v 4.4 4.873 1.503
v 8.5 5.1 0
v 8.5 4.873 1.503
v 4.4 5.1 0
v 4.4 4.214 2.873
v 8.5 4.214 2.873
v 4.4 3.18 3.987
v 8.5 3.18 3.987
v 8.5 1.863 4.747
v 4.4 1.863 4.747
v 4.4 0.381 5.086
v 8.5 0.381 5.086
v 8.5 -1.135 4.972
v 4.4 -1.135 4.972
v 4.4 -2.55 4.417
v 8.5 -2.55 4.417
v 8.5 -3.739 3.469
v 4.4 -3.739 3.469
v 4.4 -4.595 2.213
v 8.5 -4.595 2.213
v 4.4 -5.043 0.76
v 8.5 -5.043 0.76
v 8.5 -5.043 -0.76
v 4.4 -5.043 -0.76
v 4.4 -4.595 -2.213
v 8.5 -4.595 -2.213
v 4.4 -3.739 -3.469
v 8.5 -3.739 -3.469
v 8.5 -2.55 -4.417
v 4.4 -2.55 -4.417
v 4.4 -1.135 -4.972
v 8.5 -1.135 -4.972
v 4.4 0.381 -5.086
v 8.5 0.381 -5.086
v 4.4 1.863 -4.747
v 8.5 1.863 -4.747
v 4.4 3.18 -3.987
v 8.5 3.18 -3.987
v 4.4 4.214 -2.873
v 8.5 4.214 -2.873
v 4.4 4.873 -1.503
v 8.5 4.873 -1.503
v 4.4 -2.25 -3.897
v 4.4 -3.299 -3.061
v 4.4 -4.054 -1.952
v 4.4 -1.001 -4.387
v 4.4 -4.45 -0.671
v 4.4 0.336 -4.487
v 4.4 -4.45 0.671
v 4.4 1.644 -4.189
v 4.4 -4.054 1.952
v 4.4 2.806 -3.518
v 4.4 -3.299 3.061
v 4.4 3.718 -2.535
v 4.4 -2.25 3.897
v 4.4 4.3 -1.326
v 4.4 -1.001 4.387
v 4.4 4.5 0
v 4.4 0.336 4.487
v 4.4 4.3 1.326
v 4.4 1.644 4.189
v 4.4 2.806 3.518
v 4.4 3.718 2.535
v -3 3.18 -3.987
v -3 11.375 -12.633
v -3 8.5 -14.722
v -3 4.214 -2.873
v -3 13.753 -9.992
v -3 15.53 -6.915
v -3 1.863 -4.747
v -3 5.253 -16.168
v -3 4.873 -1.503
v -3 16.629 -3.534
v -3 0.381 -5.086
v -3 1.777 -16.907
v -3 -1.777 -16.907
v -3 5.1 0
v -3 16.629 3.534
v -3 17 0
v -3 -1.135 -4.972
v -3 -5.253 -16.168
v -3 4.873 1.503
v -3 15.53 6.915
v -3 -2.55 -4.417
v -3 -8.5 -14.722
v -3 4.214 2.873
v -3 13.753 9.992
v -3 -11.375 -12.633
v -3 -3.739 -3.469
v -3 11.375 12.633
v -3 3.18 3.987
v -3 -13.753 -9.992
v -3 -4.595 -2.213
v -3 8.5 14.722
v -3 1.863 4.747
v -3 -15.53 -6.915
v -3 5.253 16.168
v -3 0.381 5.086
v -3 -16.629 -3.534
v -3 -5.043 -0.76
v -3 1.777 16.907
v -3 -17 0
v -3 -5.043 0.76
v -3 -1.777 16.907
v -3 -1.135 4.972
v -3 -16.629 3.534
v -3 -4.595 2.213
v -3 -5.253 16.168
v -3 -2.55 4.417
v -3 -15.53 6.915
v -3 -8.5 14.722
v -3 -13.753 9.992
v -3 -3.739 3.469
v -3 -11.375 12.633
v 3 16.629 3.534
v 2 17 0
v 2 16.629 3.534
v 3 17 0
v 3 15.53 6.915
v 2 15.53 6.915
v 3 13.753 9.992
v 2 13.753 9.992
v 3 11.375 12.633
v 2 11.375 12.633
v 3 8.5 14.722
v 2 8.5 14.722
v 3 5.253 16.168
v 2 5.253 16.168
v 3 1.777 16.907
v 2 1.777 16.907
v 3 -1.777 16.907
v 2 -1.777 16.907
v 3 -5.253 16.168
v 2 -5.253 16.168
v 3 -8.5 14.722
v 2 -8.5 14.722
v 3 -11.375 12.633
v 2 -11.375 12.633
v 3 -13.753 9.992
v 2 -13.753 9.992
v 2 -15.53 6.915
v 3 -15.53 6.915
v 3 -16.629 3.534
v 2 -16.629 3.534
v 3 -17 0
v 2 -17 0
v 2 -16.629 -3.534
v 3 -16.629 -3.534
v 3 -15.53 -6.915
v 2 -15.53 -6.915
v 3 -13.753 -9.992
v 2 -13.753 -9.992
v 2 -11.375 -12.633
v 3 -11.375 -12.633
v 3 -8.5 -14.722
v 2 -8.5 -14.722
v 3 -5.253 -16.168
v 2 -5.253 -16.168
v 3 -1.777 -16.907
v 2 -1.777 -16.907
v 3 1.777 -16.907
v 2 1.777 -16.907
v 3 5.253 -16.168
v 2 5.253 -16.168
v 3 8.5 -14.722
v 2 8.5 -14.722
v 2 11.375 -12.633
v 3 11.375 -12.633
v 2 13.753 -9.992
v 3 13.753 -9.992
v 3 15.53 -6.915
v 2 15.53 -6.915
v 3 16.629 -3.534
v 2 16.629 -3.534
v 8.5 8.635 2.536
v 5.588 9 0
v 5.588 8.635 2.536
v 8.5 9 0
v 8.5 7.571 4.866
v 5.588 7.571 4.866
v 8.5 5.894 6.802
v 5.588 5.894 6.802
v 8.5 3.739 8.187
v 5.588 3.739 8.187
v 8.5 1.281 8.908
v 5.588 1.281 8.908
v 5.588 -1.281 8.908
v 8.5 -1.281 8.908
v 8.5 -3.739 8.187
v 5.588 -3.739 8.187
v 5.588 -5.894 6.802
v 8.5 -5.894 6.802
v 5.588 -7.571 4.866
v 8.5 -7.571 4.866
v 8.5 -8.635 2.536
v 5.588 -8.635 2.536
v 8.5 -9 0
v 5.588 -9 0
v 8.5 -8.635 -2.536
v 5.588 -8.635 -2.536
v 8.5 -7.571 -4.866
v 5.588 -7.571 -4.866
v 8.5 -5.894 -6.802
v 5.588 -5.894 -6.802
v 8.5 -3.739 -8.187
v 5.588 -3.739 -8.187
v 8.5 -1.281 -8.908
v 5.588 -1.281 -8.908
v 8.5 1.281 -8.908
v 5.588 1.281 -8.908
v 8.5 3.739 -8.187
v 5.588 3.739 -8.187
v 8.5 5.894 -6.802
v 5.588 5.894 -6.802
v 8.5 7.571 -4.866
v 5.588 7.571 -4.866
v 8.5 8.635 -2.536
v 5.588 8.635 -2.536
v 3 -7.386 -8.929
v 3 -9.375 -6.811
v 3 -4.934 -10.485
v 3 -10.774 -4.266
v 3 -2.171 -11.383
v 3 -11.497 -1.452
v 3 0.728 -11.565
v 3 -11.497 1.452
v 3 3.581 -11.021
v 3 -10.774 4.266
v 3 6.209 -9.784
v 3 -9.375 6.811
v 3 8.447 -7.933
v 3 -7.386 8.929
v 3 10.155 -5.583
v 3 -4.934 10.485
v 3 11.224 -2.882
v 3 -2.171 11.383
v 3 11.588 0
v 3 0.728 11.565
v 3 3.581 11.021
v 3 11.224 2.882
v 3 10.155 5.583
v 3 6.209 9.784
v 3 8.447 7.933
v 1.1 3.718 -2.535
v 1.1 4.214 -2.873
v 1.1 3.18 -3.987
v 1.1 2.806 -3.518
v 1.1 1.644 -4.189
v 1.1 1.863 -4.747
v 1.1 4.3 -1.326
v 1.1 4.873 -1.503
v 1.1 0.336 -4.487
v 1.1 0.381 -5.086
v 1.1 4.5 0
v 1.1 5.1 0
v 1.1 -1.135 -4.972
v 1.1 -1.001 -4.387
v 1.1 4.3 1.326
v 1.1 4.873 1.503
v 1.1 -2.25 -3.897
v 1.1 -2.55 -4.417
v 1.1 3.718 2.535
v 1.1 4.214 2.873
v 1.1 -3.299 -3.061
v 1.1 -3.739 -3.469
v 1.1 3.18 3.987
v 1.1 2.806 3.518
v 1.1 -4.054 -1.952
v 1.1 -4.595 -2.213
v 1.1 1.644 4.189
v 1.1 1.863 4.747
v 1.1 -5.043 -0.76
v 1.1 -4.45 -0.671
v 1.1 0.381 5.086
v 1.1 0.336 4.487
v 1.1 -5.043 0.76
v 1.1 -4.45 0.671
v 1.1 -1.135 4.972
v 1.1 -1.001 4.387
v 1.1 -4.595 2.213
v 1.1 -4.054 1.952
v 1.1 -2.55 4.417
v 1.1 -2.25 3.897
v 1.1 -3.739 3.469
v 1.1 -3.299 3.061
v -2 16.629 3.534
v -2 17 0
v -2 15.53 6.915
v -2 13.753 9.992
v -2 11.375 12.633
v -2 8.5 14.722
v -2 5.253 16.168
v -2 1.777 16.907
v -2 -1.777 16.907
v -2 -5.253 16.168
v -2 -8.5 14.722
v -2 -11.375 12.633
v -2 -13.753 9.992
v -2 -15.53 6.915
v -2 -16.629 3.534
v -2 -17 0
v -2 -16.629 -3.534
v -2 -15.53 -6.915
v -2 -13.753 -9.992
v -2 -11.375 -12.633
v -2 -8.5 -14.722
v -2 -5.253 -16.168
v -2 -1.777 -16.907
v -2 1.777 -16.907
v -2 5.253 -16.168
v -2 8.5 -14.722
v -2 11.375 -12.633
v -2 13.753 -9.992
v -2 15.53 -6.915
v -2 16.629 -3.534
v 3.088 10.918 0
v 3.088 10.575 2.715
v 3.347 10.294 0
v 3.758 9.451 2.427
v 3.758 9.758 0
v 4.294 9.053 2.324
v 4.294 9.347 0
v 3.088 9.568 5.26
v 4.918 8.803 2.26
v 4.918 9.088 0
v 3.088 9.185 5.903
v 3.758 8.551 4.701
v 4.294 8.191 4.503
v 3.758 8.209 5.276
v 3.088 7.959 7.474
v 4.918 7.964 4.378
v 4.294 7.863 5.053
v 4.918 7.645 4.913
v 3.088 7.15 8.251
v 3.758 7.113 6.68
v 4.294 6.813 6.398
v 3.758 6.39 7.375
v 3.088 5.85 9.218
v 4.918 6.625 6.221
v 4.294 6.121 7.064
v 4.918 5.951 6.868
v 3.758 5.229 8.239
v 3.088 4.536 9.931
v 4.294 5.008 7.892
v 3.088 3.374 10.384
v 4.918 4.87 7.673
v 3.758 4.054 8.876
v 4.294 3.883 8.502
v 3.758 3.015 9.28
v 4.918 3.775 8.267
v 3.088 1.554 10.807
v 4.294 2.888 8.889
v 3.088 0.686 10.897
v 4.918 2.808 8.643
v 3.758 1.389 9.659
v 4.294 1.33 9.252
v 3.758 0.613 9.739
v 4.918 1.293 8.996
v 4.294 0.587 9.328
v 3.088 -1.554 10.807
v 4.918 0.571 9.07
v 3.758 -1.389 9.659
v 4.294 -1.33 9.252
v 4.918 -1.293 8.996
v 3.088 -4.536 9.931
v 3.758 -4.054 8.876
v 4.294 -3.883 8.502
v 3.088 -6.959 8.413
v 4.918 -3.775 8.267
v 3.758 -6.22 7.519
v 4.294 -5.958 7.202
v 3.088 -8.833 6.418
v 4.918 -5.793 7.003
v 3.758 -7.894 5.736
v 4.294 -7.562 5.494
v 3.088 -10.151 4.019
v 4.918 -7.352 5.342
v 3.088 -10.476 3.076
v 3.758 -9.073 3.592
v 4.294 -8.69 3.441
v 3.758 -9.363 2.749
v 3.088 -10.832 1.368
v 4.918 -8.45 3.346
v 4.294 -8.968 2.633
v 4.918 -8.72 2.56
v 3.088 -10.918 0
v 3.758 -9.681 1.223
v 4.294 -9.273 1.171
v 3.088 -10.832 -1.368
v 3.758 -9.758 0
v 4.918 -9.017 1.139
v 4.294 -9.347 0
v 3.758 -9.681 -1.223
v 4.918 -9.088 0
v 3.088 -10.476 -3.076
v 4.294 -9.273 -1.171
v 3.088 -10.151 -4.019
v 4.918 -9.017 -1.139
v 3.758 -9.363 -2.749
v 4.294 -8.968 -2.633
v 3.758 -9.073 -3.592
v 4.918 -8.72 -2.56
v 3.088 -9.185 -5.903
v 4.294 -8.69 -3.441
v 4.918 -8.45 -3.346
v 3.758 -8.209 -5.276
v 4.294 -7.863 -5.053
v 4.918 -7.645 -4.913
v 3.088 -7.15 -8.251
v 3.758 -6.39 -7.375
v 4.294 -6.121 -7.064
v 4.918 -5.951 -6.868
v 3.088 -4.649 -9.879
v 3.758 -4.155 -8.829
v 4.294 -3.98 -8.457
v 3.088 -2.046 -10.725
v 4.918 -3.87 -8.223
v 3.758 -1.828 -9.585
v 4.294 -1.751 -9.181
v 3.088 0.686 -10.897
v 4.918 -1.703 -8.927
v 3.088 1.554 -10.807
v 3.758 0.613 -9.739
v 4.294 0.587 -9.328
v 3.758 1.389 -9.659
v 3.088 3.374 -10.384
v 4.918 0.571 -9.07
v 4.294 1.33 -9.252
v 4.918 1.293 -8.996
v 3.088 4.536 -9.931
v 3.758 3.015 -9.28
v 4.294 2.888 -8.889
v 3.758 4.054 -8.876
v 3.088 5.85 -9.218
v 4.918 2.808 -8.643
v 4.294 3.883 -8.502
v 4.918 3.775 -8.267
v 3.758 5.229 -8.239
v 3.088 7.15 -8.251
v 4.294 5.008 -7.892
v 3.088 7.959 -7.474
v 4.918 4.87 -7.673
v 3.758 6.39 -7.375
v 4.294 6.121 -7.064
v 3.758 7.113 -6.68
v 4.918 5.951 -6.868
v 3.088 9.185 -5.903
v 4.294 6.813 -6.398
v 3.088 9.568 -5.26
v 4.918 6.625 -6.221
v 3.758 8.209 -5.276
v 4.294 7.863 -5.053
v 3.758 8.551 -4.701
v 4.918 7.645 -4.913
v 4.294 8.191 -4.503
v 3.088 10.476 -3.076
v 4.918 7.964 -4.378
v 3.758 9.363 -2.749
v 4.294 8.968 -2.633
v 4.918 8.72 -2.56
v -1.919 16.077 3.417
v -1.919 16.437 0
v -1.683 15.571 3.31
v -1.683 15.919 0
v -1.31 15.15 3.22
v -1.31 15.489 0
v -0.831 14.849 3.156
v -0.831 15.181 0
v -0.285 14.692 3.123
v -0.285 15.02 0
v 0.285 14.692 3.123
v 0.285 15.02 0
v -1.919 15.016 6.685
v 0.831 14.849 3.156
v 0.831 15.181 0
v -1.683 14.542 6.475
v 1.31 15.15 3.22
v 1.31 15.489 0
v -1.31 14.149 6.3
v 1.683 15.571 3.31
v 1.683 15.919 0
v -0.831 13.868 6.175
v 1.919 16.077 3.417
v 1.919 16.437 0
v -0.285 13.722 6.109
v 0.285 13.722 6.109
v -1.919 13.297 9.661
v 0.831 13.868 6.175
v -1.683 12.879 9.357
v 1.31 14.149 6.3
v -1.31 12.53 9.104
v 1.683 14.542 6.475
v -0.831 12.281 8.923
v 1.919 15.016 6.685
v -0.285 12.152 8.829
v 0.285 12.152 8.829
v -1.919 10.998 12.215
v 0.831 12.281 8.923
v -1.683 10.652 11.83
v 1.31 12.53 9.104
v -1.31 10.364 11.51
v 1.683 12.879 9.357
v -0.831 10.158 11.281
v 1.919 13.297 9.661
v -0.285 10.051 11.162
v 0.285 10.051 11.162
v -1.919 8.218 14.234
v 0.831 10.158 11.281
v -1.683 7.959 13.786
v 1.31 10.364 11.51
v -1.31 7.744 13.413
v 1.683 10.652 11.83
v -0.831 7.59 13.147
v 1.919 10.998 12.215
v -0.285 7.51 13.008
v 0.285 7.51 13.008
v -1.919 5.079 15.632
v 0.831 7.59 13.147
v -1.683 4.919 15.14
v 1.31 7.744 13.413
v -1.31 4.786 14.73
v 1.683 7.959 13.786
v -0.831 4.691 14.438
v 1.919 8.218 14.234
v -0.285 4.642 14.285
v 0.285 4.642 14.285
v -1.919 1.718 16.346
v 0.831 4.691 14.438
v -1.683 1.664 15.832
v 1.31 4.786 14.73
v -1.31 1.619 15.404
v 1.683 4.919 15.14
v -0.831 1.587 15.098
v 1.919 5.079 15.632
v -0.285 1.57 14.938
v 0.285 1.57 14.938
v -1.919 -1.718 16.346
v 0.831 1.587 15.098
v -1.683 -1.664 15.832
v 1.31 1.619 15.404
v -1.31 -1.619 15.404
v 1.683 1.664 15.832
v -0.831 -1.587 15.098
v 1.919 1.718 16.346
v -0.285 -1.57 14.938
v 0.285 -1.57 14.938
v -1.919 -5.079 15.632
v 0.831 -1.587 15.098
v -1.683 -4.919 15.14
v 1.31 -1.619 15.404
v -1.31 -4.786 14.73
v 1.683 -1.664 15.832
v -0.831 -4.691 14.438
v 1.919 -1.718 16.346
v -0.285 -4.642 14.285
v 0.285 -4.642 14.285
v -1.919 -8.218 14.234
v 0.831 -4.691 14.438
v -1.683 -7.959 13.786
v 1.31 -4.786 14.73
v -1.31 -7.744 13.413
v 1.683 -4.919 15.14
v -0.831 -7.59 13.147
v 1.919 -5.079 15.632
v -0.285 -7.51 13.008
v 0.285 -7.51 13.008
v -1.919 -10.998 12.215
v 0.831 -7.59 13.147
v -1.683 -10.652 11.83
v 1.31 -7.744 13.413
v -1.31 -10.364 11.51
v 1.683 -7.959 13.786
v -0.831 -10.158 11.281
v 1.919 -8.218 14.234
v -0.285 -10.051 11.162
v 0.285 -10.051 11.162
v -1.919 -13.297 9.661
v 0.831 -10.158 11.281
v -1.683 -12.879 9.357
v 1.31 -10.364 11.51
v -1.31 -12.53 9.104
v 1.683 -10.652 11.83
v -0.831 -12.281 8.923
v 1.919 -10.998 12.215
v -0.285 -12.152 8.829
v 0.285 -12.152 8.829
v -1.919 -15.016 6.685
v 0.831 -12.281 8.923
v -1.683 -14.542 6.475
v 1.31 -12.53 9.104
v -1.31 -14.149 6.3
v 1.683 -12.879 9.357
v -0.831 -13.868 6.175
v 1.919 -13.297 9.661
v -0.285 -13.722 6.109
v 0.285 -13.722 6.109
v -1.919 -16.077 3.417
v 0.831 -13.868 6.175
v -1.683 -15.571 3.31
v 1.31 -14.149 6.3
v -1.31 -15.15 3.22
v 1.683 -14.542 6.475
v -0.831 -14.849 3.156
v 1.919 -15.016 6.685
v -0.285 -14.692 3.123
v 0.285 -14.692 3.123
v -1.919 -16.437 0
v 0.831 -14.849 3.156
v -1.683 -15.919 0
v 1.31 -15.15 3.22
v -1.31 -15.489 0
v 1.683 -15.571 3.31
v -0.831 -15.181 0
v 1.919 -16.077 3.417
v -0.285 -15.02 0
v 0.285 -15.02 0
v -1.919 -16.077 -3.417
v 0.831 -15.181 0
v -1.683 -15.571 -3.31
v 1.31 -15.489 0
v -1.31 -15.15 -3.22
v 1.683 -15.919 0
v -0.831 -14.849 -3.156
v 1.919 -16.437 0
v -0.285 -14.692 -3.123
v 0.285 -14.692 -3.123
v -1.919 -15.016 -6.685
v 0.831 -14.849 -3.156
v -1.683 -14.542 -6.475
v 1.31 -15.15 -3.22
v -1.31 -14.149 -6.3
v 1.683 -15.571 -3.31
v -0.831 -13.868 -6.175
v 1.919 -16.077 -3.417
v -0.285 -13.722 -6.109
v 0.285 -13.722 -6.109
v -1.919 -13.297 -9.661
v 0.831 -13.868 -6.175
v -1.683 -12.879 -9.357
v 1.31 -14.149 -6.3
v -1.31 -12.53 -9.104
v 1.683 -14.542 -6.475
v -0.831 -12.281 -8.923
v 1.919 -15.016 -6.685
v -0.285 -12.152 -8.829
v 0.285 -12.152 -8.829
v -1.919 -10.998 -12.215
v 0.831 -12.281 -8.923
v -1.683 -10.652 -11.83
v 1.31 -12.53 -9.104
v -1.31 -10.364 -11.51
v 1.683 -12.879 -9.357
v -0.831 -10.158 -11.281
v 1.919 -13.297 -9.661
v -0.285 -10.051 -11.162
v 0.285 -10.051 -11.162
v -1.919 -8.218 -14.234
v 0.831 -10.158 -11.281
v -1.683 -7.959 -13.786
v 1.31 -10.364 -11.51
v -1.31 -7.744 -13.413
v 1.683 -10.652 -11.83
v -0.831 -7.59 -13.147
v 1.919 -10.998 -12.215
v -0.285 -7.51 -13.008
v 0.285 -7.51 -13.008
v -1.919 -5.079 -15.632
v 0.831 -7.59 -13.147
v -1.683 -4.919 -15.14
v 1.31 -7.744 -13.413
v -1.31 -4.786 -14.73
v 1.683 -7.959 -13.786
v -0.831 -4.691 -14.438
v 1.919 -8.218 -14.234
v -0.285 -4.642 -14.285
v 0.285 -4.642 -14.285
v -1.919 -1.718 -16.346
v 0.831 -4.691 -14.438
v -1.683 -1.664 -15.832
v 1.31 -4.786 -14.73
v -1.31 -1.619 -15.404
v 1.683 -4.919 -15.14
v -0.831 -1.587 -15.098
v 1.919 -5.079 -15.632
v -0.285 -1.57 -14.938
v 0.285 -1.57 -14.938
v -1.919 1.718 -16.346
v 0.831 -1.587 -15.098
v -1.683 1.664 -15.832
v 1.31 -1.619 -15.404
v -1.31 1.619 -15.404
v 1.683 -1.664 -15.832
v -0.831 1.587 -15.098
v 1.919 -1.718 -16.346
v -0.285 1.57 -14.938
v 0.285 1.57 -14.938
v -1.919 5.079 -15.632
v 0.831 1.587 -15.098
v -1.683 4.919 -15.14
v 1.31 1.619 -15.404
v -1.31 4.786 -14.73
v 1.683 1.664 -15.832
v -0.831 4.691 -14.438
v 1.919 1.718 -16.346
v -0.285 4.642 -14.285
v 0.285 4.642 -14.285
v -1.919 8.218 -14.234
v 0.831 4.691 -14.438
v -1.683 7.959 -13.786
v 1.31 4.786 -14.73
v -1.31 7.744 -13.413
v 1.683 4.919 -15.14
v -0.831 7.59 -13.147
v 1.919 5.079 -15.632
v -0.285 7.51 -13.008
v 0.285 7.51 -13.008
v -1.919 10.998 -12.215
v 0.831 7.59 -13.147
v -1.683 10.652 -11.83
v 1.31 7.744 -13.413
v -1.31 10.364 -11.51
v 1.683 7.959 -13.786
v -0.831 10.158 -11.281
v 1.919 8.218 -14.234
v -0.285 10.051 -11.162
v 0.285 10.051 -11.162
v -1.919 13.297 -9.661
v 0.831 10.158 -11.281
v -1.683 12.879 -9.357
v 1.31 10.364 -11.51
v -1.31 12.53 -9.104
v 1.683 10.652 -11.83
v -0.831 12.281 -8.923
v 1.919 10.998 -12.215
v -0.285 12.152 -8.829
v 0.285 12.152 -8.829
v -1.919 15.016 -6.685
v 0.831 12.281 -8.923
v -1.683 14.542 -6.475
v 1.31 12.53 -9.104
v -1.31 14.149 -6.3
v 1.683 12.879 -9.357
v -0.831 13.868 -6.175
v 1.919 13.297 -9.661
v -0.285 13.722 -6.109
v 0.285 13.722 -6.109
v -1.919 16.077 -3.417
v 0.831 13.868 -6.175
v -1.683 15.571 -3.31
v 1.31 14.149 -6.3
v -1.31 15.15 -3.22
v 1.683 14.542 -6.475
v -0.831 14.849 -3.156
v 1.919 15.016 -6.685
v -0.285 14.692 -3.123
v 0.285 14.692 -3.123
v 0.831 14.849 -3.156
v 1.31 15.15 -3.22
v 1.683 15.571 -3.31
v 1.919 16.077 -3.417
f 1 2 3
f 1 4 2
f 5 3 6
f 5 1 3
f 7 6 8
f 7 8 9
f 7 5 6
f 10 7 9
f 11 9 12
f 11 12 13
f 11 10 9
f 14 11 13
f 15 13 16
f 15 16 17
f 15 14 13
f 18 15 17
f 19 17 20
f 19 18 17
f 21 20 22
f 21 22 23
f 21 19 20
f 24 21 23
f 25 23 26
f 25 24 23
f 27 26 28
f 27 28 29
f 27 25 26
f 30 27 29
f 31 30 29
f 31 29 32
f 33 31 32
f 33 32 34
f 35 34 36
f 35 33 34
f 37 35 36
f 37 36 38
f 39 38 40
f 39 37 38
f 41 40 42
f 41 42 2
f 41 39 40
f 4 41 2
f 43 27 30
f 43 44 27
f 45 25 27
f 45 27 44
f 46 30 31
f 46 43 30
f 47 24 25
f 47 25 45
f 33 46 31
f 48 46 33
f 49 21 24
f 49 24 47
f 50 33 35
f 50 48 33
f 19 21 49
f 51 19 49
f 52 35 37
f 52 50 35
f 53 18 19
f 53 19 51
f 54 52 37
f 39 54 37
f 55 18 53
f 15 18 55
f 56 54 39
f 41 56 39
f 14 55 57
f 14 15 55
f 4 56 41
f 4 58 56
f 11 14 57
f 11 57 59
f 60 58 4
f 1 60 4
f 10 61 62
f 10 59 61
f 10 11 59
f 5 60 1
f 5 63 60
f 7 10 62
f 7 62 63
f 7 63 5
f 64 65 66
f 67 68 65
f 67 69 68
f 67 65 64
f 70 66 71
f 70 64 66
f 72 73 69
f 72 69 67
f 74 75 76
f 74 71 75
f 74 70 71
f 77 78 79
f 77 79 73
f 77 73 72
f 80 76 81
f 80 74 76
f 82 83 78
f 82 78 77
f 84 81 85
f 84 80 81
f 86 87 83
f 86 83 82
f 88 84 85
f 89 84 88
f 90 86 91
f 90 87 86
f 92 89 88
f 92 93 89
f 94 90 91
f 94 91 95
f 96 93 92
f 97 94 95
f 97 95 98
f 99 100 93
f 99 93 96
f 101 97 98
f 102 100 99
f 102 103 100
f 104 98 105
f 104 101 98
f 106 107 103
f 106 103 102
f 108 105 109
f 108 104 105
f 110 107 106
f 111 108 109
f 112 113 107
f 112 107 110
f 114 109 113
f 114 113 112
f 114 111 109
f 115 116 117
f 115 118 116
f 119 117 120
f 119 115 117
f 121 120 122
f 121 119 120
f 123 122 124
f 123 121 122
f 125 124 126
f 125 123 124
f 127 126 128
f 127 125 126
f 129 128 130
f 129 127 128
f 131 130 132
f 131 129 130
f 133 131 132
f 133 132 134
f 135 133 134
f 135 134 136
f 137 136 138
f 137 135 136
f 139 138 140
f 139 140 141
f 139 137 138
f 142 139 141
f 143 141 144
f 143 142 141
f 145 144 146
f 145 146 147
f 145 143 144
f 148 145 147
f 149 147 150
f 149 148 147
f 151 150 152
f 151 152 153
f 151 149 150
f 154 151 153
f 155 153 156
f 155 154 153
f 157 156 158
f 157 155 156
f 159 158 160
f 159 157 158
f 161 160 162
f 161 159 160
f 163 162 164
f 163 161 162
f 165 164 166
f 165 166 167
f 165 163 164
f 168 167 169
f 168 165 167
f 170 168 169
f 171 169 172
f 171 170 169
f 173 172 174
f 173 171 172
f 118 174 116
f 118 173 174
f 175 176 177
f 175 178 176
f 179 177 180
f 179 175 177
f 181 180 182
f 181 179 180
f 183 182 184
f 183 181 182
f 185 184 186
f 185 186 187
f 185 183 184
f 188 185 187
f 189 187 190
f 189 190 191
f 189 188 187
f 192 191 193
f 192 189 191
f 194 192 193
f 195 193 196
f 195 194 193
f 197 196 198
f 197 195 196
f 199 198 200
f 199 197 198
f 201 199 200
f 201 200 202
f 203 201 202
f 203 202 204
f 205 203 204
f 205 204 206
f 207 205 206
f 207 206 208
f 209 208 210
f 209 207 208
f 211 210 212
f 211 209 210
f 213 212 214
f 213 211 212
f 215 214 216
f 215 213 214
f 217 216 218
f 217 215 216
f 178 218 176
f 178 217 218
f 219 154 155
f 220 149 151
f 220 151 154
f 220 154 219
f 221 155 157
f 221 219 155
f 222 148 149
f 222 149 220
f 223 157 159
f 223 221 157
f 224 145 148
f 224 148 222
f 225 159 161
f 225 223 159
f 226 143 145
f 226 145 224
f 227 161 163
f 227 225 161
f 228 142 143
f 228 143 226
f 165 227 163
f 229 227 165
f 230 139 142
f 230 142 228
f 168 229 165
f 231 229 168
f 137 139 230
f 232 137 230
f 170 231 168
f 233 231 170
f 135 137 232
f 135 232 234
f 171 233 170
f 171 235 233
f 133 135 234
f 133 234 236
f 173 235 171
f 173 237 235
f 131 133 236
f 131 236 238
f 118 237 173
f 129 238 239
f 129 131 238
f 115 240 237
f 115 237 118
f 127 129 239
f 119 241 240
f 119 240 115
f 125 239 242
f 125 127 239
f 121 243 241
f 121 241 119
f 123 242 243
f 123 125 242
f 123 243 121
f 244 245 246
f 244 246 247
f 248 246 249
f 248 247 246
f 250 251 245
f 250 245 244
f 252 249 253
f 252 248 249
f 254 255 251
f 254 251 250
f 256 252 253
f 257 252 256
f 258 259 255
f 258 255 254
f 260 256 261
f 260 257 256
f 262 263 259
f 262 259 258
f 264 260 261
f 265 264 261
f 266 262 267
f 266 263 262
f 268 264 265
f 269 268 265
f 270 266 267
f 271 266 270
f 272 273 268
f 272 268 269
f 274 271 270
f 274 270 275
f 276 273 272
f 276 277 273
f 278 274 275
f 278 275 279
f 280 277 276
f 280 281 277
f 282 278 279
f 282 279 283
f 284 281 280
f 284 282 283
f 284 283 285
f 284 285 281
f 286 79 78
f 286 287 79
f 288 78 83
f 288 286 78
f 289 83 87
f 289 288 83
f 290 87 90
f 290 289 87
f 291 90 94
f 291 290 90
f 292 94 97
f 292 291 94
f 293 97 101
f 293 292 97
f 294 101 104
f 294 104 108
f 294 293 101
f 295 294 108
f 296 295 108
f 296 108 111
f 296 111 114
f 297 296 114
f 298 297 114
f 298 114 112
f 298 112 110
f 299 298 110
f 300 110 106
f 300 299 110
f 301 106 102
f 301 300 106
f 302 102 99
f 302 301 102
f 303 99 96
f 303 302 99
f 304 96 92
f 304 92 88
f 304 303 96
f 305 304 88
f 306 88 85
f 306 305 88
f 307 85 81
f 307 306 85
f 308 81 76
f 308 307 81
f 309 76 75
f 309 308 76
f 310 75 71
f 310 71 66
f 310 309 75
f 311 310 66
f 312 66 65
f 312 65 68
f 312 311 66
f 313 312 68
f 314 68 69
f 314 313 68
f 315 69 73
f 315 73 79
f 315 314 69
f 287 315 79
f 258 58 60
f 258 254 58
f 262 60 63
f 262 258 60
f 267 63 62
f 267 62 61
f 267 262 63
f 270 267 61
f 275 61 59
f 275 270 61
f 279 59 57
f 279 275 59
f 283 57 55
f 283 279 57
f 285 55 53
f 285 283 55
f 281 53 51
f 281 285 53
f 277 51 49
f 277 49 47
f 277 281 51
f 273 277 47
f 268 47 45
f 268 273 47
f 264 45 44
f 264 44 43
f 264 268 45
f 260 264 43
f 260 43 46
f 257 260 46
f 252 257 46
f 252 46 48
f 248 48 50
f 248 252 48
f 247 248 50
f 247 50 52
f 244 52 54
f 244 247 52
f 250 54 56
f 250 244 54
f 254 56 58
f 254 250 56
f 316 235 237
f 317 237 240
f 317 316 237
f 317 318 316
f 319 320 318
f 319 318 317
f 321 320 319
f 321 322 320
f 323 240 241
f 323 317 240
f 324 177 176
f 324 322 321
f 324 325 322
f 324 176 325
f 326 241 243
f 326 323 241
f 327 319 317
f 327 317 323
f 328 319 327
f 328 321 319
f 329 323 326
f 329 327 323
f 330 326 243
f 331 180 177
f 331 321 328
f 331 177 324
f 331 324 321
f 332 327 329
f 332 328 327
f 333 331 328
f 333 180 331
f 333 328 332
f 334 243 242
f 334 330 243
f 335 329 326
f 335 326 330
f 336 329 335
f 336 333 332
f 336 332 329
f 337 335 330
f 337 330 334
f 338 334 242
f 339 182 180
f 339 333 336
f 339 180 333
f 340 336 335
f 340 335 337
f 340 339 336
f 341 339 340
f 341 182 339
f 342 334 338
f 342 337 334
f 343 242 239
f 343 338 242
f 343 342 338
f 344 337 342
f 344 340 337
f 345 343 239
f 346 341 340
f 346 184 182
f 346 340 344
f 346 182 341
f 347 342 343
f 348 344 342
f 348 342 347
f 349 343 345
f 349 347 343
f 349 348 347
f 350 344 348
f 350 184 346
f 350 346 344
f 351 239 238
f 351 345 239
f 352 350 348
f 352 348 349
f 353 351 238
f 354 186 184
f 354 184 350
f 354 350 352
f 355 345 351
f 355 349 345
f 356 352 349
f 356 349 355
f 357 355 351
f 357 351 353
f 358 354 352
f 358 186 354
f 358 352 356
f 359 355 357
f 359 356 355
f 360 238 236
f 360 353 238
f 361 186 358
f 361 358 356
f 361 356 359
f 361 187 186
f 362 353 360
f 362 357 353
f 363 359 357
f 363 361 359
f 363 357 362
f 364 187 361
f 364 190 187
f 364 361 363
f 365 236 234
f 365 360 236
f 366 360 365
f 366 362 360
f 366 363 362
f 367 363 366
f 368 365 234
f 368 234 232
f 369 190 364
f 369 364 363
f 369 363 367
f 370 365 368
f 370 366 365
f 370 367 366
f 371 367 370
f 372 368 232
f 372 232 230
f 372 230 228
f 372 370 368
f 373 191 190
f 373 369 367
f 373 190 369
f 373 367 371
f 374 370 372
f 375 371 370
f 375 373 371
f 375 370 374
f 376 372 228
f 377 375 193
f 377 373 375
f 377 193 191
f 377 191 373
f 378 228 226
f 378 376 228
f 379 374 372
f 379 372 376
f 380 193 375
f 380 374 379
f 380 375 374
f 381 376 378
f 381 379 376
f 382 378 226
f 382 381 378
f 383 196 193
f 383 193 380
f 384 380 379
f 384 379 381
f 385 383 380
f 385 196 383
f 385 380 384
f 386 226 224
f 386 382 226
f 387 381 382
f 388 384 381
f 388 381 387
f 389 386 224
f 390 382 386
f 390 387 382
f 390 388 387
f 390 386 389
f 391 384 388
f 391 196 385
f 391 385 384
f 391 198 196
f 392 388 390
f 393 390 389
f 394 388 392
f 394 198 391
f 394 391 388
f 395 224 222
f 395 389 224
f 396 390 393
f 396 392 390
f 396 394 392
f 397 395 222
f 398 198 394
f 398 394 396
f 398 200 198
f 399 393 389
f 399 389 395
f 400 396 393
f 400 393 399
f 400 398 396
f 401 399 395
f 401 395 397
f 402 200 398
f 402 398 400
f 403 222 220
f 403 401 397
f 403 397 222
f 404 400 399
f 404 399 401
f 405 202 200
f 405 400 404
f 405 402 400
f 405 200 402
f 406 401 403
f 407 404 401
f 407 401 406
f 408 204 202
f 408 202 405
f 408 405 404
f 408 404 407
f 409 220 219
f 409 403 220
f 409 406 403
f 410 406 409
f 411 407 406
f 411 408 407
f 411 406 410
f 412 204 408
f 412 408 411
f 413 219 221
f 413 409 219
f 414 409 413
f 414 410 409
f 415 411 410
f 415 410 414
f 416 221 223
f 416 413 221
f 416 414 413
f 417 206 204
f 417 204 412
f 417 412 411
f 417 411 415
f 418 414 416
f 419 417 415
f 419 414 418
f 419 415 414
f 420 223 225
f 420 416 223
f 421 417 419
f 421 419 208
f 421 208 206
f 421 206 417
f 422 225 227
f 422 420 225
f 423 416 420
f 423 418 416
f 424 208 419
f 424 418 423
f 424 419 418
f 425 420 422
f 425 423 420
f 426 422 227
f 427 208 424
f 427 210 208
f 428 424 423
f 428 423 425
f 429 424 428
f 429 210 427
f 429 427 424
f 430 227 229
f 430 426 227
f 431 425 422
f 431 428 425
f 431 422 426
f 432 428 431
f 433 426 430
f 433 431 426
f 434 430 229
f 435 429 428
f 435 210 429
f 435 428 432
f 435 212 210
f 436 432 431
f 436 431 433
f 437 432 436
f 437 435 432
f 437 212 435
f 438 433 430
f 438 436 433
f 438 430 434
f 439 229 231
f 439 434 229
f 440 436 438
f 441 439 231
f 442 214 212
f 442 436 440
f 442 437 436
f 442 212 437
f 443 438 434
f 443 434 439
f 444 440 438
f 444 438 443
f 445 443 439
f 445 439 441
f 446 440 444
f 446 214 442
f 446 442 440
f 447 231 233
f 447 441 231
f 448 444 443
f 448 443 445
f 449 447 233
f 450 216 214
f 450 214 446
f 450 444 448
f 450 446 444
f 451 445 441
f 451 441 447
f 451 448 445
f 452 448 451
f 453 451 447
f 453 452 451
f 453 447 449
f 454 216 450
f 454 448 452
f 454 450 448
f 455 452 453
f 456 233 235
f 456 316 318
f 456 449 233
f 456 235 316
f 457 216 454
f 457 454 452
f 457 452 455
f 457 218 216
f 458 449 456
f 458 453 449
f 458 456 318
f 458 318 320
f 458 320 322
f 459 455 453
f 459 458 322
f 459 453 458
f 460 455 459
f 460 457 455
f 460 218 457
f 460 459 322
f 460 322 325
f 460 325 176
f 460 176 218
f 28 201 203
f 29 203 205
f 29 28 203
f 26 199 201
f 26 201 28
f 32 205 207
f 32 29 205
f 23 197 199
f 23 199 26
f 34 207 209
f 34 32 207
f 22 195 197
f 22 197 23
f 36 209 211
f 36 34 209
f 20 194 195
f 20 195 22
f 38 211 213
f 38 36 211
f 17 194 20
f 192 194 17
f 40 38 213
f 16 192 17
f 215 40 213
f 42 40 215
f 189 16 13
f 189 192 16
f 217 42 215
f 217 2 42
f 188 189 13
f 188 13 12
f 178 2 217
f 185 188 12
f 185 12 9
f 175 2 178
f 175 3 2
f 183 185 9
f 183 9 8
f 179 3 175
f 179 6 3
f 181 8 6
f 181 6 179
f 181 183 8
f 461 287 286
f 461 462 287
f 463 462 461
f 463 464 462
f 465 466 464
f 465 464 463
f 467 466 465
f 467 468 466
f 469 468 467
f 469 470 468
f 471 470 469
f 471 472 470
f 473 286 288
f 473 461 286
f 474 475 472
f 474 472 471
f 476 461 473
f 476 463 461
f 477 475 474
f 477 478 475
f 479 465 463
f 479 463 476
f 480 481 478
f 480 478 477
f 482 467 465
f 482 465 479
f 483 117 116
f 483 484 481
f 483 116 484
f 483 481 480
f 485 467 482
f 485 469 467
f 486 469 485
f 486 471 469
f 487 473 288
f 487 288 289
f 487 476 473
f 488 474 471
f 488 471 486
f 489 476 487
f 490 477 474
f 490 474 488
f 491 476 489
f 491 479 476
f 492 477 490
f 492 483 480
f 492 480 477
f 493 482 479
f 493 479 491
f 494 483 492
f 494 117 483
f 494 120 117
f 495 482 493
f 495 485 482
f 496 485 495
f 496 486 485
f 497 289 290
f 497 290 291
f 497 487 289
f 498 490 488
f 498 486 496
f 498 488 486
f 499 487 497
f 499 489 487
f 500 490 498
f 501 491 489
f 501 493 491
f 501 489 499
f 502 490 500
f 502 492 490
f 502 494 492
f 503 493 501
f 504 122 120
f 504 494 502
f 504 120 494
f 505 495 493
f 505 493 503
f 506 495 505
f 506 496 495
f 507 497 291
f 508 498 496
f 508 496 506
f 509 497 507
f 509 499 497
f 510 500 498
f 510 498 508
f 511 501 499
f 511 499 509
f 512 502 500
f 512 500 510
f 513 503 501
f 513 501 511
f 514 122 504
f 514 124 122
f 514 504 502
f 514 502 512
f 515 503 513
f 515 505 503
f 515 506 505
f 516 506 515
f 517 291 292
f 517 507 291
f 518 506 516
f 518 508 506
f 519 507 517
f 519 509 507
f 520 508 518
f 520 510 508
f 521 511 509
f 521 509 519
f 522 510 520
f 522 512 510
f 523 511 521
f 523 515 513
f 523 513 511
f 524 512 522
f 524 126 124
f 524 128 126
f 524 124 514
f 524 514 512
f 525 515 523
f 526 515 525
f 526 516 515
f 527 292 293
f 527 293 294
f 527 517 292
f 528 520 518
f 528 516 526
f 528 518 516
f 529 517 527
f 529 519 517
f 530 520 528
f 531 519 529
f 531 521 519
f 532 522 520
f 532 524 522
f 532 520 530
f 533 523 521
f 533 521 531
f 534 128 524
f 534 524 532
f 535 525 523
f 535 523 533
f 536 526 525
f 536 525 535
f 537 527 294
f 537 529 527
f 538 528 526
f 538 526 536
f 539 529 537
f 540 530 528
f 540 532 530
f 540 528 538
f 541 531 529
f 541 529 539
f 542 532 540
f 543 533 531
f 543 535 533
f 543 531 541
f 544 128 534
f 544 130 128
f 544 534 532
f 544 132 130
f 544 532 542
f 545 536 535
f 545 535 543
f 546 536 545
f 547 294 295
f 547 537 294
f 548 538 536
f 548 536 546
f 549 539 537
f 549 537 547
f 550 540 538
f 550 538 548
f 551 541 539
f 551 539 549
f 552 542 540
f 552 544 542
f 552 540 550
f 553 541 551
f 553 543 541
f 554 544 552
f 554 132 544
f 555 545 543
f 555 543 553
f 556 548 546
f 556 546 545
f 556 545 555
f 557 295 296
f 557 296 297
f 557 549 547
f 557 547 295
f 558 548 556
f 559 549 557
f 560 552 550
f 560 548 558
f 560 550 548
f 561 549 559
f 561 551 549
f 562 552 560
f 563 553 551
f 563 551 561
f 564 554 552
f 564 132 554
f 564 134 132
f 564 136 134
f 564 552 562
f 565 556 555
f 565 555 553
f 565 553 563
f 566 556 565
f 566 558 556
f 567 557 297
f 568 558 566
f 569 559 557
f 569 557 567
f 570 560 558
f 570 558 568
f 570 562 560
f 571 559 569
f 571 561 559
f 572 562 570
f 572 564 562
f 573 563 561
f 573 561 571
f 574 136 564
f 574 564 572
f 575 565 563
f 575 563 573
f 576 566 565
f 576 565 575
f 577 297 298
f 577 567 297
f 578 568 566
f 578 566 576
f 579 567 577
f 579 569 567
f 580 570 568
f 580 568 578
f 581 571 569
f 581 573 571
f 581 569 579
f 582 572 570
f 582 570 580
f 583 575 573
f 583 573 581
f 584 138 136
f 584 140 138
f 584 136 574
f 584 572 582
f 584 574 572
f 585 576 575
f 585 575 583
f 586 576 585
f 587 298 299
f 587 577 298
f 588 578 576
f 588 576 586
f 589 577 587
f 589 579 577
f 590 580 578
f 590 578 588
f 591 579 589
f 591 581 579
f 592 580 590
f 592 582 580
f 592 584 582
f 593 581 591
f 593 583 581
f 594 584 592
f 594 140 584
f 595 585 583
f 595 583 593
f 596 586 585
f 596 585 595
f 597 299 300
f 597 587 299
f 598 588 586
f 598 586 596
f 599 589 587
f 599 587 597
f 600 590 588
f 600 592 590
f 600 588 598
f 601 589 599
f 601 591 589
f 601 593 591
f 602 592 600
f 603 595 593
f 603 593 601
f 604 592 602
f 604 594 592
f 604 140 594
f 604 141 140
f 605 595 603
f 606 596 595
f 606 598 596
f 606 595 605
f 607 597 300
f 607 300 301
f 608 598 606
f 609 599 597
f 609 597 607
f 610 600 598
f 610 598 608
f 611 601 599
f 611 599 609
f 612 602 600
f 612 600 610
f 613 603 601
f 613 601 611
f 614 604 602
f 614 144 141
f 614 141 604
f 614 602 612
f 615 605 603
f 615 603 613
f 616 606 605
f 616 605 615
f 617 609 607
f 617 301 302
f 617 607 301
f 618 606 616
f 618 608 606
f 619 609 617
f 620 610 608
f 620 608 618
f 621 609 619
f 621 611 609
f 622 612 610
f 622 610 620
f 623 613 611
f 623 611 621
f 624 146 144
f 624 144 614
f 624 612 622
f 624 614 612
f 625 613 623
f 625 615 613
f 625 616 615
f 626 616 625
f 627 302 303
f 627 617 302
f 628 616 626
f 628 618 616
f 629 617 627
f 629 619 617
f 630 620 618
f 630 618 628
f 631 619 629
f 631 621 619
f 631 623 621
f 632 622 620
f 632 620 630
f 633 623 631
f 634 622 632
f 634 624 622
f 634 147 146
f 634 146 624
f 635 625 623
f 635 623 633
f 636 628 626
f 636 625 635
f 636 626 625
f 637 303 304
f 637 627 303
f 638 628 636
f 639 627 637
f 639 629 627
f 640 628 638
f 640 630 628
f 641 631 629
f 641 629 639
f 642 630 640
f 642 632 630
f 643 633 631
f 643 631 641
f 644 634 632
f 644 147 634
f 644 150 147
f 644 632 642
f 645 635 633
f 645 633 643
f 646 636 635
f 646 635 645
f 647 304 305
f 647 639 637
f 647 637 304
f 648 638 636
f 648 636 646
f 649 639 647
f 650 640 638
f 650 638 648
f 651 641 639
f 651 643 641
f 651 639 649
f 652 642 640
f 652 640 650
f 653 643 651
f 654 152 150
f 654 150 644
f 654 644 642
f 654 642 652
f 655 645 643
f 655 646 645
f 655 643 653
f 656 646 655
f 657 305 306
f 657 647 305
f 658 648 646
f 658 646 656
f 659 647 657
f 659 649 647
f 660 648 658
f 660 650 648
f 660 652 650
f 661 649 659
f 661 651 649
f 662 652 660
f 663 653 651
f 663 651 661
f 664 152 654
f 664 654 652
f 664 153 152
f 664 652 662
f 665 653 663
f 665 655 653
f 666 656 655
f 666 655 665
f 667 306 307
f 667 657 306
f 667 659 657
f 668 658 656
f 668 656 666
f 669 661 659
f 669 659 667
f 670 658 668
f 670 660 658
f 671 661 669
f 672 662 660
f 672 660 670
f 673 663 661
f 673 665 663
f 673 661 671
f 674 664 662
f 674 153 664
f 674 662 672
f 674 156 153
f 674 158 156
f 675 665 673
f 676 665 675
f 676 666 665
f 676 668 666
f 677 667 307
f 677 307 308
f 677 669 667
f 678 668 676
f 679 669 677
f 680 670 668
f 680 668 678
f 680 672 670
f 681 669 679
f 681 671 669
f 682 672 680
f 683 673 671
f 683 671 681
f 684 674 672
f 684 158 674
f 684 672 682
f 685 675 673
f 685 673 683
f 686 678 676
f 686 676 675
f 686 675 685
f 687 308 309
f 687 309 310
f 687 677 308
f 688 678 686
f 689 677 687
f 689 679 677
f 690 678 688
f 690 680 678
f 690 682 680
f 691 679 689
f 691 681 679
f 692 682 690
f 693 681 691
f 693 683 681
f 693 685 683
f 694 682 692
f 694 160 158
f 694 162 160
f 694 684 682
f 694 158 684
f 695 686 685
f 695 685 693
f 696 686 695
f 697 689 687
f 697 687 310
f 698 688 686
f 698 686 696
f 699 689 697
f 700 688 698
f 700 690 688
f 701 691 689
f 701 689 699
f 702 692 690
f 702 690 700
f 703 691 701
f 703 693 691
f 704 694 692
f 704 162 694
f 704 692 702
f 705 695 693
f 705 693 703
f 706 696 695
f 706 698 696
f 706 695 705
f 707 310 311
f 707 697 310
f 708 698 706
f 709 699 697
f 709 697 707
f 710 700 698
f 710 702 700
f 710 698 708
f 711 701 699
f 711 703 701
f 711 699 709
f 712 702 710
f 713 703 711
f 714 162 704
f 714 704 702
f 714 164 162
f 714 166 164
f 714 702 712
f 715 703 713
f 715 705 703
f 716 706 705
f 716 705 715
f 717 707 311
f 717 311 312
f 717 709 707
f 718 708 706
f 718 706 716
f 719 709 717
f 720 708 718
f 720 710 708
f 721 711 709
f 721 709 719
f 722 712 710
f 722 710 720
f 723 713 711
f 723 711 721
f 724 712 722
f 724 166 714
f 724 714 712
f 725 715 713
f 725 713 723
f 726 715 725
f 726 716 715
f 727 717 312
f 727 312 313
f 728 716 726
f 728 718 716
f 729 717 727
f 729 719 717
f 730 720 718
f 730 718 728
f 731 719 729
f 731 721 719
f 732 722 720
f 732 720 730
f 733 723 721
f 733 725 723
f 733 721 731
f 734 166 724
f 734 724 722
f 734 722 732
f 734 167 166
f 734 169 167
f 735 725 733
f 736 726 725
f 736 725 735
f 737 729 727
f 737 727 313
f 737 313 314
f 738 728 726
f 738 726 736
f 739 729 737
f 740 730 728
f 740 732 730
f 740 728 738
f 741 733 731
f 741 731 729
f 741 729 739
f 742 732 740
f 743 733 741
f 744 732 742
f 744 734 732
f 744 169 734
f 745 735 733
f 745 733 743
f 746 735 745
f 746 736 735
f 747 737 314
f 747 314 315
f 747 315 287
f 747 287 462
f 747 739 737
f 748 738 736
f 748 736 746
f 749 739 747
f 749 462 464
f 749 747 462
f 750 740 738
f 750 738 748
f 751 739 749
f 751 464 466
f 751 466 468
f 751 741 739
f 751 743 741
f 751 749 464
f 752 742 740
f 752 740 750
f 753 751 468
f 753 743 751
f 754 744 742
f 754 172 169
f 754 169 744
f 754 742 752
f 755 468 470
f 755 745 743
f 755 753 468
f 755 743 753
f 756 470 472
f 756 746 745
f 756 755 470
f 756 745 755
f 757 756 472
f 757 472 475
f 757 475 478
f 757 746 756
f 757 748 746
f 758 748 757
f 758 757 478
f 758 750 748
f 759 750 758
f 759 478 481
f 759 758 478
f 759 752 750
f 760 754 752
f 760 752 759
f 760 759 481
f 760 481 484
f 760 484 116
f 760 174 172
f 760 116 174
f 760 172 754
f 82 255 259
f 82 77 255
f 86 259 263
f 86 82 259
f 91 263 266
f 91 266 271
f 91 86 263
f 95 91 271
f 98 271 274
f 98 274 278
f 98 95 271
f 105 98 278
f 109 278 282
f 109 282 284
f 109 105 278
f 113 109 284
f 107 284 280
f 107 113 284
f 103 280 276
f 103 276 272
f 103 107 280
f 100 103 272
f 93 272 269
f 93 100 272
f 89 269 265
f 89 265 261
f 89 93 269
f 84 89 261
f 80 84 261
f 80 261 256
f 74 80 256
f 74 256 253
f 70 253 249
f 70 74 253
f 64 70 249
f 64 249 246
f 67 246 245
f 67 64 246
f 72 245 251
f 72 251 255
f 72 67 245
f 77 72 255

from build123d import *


with BuildPart() as part:
    # 草图1 → 旋转1 (revolve)
    with BuildSketch(Plane.XY):
        with BuildLine():
            Line((2, 17), (3, 17))
            Line((3, 17), (3, 11.587964483))
            ThreePointArc((3, 11.587964483), (3.757997248, 9.757997248), (5.587964483, 9))
            Line((5.587964483, 9), (8.5, 9))
            Line((8.5, 9), (8.5, 5.1))
            Line((8.5, 5.1), (4.4, 5.1))
            Line((4.4, 5.1), (4.4, 4.5))
            Line((4.4, 4.5), (1.1, 4.5))
            Line((1.1, 4.5), (1.1, 5.1))
            Line((1.1, 5.1), (-3, 5.1))
            Line((-3, 5.1), (-3, 17))
            Line((-3, 17), (-2, 17))
            ThreePointArc((-2, 17), (0, 15), (2, 17))
        make_face()
    revolve(axis=Axis((0, 0, 0), (1, 0, 0)))


solid = part.part
